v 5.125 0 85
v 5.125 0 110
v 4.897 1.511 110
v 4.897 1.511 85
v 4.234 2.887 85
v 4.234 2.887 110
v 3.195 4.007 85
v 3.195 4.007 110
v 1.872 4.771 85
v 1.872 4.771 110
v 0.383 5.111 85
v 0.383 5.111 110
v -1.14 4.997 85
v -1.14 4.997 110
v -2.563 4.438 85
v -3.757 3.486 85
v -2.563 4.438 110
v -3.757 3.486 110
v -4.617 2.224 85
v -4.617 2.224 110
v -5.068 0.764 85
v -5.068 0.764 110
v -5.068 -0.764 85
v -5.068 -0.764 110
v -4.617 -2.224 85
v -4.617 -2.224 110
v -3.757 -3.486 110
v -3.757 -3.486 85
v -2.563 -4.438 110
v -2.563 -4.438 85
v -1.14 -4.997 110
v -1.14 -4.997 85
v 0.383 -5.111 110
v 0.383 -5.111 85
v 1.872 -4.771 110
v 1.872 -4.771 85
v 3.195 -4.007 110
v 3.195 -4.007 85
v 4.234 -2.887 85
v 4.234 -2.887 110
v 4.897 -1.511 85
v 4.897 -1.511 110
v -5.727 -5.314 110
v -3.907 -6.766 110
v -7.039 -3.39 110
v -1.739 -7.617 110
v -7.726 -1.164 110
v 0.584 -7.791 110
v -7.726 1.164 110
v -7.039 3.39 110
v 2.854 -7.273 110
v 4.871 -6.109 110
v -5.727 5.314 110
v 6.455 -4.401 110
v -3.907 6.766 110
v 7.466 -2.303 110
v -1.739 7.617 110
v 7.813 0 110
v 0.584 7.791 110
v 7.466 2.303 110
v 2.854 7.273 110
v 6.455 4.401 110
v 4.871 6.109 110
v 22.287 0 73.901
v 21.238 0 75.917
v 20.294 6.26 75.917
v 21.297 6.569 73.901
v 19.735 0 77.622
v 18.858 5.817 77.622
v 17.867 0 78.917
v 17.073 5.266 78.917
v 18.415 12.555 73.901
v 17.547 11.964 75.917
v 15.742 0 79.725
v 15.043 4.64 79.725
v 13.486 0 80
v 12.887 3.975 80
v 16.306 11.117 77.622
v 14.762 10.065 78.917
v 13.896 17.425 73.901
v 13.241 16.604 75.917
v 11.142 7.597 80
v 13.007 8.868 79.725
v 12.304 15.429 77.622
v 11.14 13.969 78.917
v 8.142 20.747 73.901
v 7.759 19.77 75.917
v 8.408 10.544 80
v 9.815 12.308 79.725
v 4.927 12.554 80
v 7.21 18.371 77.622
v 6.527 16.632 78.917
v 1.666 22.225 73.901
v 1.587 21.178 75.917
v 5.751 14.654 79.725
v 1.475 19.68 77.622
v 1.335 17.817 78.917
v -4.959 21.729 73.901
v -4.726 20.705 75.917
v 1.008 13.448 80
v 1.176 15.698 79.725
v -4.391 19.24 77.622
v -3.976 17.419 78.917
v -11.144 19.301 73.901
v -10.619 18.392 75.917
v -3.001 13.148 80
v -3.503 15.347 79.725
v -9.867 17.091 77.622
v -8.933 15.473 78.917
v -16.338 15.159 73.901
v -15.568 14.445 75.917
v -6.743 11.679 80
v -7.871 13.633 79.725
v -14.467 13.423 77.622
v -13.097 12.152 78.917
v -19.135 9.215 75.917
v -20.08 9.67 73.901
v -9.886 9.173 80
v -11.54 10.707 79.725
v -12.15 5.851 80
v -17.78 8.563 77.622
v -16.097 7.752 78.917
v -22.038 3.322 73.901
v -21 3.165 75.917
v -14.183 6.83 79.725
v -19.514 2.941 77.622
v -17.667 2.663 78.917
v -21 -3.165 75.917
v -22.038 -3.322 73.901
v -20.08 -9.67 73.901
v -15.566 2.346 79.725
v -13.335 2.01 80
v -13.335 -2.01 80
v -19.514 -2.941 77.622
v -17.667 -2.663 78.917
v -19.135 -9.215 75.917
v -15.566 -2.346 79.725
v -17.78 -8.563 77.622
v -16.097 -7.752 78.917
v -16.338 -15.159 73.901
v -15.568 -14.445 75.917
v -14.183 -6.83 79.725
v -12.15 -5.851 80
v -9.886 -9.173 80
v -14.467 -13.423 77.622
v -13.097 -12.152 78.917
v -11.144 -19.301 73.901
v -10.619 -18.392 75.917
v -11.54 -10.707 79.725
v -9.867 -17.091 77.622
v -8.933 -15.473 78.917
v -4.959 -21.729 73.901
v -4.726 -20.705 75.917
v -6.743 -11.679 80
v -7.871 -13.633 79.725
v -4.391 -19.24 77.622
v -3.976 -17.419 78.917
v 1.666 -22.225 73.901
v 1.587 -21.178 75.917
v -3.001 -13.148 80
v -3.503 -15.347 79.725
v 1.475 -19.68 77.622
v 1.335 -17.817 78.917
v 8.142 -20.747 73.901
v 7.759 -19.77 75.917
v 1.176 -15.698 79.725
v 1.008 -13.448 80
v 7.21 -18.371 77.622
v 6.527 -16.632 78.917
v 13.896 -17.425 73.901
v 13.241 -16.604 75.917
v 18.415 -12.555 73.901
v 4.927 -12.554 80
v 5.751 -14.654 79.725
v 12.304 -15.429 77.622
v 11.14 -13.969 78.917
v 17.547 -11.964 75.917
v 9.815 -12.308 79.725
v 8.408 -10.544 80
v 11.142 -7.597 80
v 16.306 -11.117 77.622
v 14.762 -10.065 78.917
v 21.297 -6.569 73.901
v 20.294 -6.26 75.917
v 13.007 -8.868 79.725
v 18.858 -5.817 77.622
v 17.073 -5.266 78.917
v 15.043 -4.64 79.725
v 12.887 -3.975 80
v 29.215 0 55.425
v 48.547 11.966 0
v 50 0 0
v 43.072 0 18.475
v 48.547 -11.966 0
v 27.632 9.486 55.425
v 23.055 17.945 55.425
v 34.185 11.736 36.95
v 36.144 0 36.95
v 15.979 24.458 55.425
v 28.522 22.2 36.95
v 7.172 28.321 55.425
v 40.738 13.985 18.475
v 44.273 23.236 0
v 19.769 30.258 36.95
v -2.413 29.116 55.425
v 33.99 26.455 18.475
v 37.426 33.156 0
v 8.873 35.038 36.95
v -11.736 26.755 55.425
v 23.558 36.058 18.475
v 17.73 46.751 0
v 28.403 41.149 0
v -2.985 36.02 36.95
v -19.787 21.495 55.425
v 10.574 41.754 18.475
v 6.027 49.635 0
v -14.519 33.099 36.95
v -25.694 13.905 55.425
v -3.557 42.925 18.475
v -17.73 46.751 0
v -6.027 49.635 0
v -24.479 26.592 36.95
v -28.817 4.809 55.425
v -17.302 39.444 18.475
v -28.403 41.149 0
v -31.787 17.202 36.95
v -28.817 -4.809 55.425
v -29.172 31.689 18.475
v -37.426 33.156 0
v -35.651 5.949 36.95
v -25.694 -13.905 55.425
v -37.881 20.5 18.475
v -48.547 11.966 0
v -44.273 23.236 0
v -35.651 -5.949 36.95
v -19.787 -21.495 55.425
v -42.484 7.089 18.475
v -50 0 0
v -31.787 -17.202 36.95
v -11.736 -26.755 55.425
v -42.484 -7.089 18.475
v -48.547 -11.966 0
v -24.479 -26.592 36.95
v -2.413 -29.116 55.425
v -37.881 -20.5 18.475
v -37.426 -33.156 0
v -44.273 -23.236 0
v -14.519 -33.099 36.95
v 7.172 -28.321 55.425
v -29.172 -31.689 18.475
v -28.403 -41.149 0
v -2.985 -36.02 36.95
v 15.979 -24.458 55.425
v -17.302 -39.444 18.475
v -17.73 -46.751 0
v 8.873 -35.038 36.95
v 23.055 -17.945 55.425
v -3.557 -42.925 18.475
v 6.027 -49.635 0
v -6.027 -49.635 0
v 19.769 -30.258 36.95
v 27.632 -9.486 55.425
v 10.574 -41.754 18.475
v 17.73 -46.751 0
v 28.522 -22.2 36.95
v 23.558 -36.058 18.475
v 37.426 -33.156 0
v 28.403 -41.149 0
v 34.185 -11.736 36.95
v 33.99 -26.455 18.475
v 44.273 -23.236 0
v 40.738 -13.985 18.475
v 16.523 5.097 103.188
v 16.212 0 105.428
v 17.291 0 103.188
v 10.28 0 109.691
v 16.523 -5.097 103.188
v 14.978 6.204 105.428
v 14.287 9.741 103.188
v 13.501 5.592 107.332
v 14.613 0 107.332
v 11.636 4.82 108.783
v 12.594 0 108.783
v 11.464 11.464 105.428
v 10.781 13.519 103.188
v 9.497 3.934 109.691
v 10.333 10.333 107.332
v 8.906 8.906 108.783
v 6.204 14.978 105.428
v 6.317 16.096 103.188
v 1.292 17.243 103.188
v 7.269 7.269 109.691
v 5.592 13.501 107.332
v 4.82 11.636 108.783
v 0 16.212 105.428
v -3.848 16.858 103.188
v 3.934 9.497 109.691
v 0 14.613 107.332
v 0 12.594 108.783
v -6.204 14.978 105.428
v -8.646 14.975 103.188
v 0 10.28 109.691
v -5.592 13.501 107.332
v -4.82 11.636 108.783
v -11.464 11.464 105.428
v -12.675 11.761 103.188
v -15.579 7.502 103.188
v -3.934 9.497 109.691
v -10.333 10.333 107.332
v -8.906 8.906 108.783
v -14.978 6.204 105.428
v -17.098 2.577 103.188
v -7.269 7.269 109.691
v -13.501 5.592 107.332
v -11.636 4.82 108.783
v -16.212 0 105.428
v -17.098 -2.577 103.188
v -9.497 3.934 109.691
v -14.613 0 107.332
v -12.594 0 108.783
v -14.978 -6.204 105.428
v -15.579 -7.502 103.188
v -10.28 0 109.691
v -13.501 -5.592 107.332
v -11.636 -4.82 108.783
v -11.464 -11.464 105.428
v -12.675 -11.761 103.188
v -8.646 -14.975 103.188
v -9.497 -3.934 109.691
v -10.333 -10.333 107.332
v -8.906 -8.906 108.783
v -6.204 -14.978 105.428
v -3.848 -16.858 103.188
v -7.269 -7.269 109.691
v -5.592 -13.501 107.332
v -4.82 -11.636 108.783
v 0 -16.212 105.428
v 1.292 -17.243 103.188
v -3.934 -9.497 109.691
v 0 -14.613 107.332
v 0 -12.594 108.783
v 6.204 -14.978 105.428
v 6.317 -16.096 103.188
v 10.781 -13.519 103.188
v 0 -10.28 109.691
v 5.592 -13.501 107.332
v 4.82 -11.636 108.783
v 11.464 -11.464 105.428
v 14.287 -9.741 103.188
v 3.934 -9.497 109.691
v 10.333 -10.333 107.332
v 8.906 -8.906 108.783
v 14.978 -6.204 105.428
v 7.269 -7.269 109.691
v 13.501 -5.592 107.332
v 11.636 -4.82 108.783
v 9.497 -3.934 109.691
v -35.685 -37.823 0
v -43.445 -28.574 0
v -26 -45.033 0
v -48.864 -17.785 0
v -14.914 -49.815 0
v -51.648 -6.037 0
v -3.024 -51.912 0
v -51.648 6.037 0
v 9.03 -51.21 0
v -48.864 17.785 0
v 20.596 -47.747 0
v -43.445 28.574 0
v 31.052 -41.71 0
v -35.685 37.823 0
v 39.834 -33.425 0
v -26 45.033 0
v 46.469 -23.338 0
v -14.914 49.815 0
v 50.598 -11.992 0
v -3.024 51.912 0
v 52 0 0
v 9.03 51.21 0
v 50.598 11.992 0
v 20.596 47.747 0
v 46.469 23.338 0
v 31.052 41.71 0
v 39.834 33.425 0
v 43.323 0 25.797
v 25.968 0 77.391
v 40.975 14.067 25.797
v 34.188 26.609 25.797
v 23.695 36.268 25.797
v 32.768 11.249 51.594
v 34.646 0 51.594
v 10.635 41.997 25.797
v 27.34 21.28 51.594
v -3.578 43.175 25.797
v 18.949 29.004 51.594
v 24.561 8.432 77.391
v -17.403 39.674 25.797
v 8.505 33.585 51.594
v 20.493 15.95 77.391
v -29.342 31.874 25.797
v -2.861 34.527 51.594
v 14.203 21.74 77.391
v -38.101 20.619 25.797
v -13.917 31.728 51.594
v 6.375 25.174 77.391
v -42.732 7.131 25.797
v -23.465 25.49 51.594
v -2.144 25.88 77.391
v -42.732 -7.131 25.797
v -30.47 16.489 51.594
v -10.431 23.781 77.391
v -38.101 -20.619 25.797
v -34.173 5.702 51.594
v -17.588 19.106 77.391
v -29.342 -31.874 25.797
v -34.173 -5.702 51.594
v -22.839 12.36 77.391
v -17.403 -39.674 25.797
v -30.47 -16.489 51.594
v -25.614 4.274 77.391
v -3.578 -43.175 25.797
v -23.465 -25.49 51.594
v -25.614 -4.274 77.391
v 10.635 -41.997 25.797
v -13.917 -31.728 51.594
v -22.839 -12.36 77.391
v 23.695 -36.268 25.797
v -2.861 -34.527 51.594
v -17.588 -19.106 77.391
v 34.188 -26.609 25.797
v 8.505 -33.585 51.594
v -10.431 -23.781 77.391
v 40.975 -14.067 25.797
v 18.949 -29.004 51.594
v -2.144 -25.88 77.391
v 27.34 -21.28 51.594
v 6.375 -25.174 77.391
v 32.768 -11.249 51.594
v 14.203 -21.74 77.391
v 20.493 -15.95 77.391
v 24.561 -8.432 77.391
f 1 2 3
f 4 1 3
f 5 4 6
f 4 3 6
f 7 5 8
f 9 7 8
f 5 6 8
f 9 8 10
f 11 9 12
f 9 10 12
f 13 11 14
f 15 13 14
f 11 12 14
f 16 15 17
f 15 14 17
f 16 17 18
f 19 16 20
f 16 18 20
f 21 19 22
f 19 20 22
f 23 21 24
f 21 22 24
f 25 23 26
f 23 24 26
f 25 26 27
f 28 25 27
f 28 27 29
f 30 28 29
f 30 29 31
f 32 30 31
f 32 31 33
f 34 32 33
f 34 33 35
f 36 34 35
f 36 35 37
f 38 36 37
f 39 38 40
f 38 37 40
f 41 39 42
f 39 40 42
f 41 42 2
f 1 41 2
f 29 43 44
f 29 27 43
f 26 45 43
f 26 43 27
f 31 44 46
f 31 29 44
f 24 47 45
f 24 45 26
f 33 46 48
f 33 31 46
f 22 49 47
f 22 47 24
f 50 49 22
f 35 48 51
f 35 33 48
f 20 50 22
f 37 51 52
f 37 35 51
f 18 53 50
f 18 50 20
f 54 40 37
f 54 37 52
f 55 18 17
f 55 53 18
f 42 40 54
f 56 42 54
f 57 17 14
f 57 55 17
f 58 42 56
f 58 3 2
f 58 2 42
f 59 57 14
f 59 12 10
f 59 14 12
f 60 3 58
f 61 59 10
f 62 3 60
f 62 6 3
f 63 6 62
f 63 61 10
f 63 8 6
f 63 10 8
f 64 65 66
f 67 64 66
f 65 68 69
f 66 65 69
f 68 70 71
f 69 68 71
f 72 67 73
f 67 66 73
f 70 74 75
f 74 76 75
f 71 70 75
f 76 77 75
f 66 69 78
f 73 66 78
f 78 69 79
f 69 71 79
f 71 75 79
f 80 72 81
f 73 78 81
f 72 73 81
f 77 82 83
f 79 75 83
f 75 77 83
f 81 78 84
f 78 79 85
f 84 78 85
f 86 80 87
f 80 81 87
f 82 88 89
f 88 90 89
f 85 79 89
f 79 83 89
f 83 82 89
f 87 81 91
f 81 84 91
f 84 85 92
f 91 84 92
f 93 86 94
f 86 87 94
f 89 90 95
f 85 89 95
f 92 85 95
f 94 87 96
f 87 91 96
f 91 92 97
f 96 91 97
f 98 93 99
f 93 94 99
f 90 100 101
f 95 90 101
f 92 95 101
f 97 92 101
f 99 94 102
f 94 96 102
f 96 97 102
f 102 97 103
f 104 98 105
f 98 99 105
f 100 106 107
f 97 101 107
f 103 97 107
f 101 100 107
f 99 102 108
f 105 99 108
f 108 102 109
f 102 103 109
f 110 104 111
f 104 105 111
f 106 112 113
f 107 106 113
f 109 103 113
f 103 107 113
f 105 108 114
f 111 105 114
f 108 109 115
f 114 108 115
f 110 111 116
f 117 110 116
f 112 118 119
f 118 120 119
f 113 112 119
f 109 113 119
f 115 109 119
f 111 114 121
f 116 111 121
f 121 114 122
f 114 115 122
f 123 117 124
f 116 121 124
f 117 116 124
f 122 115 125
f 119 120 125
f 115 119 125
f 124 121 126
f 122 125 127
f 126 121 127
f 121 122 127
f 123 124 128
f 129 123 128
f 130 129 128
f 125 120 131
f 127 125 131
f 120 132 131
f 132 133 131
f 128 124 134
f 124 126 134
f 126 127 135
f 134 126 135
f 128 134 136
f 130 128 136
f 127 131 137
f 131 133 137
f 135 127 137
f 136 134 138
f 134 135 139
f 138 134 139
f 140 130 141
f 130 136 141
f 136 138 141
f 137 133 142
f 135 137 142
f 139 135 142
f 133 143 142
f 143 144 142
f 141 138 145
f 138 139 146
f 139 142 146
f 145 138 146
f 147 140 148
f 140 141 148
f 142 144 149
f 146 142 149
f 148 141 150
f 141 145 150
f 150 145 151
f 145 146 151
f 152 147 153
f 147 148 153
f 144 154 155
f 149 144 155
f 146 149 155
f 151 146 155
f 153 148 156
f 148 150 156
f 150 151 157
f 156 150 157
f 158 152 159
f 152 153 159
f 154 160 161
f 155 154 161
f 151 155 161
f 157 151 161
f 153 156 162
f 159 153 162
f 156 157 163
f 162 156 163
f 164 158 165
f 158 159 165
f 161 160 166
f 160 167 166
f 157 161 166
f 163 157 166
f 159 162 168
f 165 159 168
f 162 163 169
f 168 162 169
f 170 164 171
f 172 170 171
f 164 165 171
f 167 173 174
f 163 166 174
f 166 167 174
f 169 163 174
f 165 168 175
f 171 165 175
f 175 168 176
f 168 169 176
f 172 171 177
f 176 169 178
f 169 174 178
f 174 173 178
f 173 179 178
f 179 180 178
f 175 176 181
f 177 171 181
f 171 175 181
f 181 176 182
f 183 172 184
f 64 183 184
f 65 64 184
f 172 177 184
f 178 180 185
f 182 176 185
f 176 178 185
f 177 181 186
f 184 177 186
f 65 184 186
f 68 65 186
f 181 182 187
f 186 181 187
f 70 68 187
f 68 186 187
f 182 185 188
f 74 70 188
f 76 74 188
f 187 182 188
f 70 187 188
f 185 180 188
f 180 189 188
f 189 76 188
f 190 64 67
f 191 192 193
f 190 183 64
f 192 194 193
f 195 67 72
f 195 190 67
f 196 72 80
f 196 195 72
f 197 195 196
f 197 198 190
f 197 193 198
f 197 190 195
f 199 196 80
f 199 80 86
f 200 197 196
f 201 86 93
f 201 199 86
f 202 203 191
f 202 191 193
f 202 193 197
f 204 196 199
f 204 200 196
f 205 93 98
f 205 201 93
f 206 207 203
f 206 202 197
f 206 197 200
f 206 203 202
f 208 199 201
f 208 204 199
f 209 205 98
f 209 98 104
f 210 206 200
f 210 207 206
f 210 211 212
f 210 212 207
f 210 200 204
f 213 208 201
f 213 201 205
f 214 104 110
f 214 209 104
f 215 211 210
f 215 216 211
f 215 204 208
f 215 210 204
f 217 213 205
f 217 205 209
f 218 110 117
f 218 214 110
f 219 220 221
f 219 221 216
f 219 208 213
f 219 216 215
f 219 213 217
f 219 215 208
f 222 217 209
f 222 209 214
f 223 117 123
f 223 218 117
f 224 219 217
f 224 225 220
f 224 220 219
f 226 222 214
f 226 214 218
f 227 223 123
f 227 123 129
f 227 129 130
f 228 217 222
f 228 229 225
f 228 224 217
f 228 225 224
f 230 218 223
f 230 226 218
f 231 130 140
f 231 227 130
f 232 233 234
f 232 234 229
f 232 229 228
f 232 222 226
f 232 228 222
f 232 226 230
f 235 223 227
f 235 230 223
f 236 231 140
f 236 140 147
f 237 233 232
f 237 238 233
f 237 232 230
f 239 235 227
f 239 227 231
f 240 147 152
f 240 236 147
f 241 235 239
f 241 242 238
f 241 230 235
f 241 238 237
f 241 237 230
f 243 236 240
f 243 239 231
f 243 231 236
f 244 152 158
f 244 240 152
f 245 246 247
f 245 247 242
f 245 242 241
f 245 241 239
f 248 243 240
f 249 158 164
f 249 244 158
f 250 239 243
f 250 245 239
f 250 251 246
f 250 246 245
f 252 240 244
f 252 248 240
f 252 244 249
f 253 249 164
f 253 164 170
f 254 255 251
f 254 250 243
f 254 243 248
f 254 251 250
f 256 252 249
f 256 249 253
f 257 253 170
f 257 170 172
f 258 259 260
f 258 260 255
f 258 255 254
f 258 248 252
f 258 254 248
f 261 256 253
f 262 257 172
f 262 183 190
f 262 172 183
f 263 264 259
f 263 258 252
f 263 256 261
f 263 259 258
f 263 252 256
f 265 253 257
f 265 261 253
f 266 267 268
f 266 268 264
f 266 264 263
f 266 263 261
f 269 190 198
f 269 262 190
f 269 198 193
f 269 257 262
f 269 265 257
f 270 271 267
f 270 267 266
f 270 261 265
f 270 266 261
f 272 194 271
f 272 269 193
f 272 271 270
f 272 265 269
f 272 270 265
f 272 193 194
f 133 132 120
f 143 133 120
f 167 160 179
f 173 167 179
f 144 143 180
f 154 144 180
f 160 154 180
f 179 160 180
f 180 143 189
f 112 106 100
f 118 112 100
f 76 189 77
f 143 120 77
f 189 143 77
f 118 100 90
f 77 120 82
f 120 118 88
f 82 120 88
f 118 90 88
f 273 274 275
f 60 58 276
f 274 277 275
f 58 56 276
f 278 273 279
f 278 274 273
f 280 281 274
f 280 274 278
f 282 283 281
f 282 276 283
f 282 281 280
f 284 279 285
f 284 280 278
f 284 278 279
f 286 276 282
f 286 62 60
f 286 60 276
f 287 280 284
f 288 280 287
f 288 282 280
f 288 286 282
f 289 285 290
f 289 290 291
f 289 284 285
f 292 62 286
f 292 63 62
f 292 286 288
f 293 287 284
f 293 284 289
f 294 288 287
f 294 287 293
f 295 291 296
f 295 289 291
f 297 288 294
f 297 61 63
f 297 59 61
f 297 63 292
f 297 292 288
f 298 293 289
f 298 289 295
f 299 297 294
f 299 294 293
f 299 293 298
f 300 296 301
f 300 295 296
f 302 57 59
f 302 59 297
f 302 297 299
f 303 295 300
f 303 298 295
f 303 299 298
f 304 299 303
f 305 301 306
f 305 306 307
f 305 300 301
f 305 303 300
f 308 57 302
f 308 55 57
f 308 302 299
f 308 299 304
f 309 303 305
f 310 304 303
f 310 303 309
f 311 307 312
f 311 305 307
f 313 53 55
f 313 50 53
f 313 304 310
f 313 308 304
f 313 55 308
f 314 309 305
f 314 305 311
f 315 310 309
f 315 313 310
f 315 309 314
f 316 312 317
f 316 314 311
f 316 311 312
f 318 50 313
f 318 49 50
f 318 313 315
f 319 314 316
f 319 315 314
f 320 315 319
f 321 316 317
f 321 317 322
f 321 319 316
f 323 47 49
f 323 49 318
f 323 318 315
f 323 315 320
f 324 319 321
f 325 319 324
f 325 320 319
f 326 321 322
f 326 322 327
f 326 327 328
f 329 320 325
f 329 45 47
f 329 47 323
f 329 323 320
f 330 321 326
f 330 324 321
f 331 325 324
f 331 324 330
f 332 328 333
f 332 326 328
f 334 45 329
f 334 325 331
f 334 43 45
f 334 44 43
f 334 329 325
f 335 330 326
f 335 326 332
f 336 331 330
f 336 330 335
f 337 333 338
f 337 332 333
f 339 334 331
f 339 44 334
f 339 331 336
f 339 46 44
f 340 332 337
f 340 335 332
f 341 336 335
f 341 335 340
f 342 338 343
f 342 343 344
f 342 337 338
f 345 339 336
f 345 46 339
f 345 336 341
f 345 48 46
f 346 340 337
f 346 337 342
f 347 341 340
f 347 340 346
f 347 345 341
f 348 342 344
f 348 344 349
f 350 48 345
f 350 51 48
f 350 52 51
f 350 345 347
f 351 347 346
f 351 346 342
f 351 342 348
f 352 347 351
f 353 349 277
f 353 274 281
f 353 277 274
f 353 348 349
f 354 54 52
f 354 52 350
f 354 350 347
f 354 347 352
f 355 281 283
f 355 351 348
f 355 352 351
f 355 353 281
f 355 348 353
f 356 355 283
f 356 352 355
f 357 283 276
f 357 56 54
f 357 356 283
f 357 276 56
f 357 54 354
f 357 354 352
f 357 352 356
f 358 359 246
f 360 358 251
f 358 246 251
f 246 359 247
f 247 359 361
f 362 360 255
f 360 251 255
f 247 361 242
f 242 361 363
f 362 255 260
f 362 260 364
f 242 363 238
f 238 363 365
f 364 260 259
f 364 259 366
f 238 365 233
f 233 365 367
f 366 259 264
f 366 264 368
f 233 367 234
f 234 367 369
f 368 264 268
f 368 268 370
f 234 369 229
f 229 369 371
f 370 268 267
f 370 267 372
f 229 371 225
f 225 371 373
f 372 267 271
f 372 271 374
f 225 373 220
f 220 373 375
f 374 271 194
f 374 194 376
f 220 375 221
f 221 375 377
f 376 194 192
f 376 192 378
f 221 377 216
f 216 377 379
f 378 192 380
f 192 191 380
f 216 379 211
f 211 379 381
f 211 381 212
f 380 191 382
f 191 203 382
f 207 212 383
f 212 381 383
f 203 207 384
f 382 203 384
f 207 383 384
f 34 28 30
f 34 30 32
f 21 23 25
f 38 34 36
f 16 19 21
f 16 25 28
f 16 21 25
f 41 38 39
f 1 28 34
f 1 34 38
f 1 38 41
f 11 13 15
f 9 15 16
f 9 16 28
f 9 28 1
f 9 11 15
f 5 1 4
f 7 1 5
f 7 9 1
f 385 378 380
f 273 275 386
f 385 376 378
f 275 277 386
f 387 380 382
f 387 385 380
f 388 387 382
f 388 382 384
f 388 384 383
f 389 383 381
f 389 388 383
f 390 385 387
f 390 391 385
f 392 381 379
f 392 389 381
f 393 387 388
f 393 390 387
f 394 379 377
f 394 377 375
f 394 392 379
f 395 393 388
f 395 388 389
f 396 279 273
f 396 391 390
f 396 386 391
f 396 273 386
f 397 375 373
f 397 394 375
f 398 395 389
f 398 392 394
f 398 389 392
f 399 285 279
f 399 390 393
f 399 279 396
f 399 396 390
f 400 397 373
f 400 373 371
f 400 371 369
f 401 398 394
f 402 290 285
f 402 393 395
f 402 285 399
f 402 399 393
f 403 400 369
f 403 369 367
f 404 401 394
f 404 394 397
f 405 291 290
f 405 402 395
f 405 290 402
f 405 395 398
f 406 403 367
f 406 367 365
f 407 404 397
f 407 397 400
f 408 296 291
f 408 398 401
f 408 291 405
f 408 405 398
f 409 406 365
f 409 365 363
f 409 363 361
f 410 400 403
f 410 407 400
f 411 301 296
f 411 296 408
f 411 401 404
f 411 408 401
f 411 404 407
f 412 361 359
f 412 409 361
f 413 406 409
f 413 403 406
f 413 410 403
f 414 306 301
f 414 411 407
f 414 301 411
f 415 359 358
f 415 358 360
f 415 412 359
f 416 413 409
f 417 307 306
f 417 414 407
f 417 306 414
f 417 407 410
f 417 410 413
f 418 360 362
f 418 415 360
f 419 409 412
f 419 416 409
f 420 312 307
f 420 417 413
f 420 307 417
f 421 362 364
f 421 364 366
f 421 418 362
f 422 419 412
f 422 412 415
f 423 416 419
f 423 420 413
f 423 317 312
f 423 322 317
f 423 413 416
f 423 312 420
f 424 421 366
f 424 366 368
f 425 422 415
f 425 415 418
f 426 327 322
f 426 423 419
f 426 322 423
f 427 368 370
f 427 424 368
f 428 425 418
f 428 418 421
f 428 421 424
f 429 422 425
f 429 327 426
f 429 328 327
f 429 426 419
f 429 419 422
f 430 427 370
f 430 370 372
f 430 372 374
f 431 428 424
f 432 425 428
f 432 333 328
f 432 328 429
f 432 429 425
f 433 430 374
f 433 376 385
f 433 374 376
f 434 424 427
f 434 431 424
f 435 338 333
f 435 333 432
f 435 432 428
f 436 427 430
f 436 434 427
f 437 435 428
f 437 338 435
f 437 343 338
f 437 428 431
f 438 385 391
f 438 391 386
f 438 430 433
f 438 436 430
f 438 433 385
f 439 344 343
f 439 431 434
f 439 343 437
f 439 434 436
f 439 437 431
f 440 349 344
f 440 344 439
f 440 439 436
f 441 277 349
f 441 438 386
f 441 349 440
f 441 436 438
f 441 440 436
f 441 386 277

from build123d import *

# Parameters (mm, degrees)
F0_R      = 52
F4_R      = 15
F2_R      = 20
F6_R      = 50
F9_R      = 5.125
F10_DEPTH = 25
F11_R     = 10
F12_R     = 9.4


with BuildPart() as f5:
    # F0 (on Top) → F5 section 0
    with BuildSketch(Plane.XY):
        Circle(F0_R)
    # F4 (on offset) → F5 section 1
    with BuildSketch(Plane.XY.offset(110)):
        Circle(F4_R)
    loft()

    # F2 (on offset) → F7 section 0
    with BuildSketch(Plane.XY.offset(80)):
        Circle(F2_R)
    # F6 (on face) → F7 section 1
    with BuildSketch(Plane(origin=(0, 0, 0), x_dir=(1, 0, 0), z_dir=(0, 0, -1))):
        Circle(F6_R)
    loft(mode=Mode.SUBTRACT)

    # F9 (on face) → F10 (cut)
    with BuildSketch(Plane.XY.offset(110)):
        Circle(F9_R)
    extrude(amount=-F10_DEPTH, mode=Mode.SUBTRACT)

    # F11
    f11_edges = [f5.edges().sort_by_distance(p)[0] for p in [
        (-15, 0, 110),
    ]]
    fillet(f11_edges, radius=F11_R)

    # F12
    f12_edges = [f5.edges().sort_by_distance(p)[0] for p in [
        (-20, 0, 80),
    ]]
    fillet(f12_edges, radius=F12_R)


solid = f5.part
